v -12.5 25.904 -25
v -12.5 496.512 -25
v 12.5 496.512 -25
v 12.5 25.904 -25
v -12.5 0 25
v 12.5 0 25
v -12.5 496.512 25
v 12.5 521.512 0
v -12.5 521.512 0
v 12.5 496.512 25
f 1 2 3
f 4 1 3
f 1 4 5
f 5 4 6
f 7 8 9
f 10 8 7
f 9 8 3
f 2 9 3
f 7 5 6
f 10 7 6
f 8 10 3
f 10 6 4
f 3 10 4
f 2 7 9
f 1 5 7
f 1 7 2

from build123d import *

# Parameters (mm, degrees)
SKETCH_1_W          = 25
SKETCH_1_H          = 50
EXTRUDE_1_DEPTH     = 521.512
CUT_EXTRUDE_1_DEPTH = 521.51
CUT_EXTRUDE_2_DEPTH = 521.51


with BuildPart() as part:
    # Эскиз1 → Бобышка-Вытянуть1 (new body)
    with BuildSketch(Plane(origin=(0, 0, 0), x_dir=(1, 0, 0), z_dir=(0, 1, 0))):
        Rectangle(SKETCH_1_W, SKETCH_1_H)
    extrude(amount=EXTRUDE_1_DEPTH)

    # Эскиз2 → Вырез-Вытянуть1 (cut)
    with BuildSketch(Plane(origin=(12.5, 0, 0), x_dir=(0, 0, -1), z_dir=(1, 0, 0))):
        Polygon((-25, 521.512), (0, 521.512), (-25, 496.512), align=None)
        Polygon((25, 0), (25, 25.90361446), (-25, 0), align=None)
    extrude(amount=-CUT_EXTRUDE_1_DEPTH, mode=Mode.SUBTRACT)

    # Эскиз3 → Вырез-Вытянуть2 (cut)
    with BuildSketch(Plane(origin=(12.5, 0, 0), x_dir=(0, 0, -1), z_dir=(1, 0, 0))):
        Polygon((0, 521.512), (25, 496.512), (25, 521.512), align=None)
    extrude(amount=-CUT_EXTRUDE_2_DEPTH, mode=Mode.SUBTRACT)


solid = part.part
